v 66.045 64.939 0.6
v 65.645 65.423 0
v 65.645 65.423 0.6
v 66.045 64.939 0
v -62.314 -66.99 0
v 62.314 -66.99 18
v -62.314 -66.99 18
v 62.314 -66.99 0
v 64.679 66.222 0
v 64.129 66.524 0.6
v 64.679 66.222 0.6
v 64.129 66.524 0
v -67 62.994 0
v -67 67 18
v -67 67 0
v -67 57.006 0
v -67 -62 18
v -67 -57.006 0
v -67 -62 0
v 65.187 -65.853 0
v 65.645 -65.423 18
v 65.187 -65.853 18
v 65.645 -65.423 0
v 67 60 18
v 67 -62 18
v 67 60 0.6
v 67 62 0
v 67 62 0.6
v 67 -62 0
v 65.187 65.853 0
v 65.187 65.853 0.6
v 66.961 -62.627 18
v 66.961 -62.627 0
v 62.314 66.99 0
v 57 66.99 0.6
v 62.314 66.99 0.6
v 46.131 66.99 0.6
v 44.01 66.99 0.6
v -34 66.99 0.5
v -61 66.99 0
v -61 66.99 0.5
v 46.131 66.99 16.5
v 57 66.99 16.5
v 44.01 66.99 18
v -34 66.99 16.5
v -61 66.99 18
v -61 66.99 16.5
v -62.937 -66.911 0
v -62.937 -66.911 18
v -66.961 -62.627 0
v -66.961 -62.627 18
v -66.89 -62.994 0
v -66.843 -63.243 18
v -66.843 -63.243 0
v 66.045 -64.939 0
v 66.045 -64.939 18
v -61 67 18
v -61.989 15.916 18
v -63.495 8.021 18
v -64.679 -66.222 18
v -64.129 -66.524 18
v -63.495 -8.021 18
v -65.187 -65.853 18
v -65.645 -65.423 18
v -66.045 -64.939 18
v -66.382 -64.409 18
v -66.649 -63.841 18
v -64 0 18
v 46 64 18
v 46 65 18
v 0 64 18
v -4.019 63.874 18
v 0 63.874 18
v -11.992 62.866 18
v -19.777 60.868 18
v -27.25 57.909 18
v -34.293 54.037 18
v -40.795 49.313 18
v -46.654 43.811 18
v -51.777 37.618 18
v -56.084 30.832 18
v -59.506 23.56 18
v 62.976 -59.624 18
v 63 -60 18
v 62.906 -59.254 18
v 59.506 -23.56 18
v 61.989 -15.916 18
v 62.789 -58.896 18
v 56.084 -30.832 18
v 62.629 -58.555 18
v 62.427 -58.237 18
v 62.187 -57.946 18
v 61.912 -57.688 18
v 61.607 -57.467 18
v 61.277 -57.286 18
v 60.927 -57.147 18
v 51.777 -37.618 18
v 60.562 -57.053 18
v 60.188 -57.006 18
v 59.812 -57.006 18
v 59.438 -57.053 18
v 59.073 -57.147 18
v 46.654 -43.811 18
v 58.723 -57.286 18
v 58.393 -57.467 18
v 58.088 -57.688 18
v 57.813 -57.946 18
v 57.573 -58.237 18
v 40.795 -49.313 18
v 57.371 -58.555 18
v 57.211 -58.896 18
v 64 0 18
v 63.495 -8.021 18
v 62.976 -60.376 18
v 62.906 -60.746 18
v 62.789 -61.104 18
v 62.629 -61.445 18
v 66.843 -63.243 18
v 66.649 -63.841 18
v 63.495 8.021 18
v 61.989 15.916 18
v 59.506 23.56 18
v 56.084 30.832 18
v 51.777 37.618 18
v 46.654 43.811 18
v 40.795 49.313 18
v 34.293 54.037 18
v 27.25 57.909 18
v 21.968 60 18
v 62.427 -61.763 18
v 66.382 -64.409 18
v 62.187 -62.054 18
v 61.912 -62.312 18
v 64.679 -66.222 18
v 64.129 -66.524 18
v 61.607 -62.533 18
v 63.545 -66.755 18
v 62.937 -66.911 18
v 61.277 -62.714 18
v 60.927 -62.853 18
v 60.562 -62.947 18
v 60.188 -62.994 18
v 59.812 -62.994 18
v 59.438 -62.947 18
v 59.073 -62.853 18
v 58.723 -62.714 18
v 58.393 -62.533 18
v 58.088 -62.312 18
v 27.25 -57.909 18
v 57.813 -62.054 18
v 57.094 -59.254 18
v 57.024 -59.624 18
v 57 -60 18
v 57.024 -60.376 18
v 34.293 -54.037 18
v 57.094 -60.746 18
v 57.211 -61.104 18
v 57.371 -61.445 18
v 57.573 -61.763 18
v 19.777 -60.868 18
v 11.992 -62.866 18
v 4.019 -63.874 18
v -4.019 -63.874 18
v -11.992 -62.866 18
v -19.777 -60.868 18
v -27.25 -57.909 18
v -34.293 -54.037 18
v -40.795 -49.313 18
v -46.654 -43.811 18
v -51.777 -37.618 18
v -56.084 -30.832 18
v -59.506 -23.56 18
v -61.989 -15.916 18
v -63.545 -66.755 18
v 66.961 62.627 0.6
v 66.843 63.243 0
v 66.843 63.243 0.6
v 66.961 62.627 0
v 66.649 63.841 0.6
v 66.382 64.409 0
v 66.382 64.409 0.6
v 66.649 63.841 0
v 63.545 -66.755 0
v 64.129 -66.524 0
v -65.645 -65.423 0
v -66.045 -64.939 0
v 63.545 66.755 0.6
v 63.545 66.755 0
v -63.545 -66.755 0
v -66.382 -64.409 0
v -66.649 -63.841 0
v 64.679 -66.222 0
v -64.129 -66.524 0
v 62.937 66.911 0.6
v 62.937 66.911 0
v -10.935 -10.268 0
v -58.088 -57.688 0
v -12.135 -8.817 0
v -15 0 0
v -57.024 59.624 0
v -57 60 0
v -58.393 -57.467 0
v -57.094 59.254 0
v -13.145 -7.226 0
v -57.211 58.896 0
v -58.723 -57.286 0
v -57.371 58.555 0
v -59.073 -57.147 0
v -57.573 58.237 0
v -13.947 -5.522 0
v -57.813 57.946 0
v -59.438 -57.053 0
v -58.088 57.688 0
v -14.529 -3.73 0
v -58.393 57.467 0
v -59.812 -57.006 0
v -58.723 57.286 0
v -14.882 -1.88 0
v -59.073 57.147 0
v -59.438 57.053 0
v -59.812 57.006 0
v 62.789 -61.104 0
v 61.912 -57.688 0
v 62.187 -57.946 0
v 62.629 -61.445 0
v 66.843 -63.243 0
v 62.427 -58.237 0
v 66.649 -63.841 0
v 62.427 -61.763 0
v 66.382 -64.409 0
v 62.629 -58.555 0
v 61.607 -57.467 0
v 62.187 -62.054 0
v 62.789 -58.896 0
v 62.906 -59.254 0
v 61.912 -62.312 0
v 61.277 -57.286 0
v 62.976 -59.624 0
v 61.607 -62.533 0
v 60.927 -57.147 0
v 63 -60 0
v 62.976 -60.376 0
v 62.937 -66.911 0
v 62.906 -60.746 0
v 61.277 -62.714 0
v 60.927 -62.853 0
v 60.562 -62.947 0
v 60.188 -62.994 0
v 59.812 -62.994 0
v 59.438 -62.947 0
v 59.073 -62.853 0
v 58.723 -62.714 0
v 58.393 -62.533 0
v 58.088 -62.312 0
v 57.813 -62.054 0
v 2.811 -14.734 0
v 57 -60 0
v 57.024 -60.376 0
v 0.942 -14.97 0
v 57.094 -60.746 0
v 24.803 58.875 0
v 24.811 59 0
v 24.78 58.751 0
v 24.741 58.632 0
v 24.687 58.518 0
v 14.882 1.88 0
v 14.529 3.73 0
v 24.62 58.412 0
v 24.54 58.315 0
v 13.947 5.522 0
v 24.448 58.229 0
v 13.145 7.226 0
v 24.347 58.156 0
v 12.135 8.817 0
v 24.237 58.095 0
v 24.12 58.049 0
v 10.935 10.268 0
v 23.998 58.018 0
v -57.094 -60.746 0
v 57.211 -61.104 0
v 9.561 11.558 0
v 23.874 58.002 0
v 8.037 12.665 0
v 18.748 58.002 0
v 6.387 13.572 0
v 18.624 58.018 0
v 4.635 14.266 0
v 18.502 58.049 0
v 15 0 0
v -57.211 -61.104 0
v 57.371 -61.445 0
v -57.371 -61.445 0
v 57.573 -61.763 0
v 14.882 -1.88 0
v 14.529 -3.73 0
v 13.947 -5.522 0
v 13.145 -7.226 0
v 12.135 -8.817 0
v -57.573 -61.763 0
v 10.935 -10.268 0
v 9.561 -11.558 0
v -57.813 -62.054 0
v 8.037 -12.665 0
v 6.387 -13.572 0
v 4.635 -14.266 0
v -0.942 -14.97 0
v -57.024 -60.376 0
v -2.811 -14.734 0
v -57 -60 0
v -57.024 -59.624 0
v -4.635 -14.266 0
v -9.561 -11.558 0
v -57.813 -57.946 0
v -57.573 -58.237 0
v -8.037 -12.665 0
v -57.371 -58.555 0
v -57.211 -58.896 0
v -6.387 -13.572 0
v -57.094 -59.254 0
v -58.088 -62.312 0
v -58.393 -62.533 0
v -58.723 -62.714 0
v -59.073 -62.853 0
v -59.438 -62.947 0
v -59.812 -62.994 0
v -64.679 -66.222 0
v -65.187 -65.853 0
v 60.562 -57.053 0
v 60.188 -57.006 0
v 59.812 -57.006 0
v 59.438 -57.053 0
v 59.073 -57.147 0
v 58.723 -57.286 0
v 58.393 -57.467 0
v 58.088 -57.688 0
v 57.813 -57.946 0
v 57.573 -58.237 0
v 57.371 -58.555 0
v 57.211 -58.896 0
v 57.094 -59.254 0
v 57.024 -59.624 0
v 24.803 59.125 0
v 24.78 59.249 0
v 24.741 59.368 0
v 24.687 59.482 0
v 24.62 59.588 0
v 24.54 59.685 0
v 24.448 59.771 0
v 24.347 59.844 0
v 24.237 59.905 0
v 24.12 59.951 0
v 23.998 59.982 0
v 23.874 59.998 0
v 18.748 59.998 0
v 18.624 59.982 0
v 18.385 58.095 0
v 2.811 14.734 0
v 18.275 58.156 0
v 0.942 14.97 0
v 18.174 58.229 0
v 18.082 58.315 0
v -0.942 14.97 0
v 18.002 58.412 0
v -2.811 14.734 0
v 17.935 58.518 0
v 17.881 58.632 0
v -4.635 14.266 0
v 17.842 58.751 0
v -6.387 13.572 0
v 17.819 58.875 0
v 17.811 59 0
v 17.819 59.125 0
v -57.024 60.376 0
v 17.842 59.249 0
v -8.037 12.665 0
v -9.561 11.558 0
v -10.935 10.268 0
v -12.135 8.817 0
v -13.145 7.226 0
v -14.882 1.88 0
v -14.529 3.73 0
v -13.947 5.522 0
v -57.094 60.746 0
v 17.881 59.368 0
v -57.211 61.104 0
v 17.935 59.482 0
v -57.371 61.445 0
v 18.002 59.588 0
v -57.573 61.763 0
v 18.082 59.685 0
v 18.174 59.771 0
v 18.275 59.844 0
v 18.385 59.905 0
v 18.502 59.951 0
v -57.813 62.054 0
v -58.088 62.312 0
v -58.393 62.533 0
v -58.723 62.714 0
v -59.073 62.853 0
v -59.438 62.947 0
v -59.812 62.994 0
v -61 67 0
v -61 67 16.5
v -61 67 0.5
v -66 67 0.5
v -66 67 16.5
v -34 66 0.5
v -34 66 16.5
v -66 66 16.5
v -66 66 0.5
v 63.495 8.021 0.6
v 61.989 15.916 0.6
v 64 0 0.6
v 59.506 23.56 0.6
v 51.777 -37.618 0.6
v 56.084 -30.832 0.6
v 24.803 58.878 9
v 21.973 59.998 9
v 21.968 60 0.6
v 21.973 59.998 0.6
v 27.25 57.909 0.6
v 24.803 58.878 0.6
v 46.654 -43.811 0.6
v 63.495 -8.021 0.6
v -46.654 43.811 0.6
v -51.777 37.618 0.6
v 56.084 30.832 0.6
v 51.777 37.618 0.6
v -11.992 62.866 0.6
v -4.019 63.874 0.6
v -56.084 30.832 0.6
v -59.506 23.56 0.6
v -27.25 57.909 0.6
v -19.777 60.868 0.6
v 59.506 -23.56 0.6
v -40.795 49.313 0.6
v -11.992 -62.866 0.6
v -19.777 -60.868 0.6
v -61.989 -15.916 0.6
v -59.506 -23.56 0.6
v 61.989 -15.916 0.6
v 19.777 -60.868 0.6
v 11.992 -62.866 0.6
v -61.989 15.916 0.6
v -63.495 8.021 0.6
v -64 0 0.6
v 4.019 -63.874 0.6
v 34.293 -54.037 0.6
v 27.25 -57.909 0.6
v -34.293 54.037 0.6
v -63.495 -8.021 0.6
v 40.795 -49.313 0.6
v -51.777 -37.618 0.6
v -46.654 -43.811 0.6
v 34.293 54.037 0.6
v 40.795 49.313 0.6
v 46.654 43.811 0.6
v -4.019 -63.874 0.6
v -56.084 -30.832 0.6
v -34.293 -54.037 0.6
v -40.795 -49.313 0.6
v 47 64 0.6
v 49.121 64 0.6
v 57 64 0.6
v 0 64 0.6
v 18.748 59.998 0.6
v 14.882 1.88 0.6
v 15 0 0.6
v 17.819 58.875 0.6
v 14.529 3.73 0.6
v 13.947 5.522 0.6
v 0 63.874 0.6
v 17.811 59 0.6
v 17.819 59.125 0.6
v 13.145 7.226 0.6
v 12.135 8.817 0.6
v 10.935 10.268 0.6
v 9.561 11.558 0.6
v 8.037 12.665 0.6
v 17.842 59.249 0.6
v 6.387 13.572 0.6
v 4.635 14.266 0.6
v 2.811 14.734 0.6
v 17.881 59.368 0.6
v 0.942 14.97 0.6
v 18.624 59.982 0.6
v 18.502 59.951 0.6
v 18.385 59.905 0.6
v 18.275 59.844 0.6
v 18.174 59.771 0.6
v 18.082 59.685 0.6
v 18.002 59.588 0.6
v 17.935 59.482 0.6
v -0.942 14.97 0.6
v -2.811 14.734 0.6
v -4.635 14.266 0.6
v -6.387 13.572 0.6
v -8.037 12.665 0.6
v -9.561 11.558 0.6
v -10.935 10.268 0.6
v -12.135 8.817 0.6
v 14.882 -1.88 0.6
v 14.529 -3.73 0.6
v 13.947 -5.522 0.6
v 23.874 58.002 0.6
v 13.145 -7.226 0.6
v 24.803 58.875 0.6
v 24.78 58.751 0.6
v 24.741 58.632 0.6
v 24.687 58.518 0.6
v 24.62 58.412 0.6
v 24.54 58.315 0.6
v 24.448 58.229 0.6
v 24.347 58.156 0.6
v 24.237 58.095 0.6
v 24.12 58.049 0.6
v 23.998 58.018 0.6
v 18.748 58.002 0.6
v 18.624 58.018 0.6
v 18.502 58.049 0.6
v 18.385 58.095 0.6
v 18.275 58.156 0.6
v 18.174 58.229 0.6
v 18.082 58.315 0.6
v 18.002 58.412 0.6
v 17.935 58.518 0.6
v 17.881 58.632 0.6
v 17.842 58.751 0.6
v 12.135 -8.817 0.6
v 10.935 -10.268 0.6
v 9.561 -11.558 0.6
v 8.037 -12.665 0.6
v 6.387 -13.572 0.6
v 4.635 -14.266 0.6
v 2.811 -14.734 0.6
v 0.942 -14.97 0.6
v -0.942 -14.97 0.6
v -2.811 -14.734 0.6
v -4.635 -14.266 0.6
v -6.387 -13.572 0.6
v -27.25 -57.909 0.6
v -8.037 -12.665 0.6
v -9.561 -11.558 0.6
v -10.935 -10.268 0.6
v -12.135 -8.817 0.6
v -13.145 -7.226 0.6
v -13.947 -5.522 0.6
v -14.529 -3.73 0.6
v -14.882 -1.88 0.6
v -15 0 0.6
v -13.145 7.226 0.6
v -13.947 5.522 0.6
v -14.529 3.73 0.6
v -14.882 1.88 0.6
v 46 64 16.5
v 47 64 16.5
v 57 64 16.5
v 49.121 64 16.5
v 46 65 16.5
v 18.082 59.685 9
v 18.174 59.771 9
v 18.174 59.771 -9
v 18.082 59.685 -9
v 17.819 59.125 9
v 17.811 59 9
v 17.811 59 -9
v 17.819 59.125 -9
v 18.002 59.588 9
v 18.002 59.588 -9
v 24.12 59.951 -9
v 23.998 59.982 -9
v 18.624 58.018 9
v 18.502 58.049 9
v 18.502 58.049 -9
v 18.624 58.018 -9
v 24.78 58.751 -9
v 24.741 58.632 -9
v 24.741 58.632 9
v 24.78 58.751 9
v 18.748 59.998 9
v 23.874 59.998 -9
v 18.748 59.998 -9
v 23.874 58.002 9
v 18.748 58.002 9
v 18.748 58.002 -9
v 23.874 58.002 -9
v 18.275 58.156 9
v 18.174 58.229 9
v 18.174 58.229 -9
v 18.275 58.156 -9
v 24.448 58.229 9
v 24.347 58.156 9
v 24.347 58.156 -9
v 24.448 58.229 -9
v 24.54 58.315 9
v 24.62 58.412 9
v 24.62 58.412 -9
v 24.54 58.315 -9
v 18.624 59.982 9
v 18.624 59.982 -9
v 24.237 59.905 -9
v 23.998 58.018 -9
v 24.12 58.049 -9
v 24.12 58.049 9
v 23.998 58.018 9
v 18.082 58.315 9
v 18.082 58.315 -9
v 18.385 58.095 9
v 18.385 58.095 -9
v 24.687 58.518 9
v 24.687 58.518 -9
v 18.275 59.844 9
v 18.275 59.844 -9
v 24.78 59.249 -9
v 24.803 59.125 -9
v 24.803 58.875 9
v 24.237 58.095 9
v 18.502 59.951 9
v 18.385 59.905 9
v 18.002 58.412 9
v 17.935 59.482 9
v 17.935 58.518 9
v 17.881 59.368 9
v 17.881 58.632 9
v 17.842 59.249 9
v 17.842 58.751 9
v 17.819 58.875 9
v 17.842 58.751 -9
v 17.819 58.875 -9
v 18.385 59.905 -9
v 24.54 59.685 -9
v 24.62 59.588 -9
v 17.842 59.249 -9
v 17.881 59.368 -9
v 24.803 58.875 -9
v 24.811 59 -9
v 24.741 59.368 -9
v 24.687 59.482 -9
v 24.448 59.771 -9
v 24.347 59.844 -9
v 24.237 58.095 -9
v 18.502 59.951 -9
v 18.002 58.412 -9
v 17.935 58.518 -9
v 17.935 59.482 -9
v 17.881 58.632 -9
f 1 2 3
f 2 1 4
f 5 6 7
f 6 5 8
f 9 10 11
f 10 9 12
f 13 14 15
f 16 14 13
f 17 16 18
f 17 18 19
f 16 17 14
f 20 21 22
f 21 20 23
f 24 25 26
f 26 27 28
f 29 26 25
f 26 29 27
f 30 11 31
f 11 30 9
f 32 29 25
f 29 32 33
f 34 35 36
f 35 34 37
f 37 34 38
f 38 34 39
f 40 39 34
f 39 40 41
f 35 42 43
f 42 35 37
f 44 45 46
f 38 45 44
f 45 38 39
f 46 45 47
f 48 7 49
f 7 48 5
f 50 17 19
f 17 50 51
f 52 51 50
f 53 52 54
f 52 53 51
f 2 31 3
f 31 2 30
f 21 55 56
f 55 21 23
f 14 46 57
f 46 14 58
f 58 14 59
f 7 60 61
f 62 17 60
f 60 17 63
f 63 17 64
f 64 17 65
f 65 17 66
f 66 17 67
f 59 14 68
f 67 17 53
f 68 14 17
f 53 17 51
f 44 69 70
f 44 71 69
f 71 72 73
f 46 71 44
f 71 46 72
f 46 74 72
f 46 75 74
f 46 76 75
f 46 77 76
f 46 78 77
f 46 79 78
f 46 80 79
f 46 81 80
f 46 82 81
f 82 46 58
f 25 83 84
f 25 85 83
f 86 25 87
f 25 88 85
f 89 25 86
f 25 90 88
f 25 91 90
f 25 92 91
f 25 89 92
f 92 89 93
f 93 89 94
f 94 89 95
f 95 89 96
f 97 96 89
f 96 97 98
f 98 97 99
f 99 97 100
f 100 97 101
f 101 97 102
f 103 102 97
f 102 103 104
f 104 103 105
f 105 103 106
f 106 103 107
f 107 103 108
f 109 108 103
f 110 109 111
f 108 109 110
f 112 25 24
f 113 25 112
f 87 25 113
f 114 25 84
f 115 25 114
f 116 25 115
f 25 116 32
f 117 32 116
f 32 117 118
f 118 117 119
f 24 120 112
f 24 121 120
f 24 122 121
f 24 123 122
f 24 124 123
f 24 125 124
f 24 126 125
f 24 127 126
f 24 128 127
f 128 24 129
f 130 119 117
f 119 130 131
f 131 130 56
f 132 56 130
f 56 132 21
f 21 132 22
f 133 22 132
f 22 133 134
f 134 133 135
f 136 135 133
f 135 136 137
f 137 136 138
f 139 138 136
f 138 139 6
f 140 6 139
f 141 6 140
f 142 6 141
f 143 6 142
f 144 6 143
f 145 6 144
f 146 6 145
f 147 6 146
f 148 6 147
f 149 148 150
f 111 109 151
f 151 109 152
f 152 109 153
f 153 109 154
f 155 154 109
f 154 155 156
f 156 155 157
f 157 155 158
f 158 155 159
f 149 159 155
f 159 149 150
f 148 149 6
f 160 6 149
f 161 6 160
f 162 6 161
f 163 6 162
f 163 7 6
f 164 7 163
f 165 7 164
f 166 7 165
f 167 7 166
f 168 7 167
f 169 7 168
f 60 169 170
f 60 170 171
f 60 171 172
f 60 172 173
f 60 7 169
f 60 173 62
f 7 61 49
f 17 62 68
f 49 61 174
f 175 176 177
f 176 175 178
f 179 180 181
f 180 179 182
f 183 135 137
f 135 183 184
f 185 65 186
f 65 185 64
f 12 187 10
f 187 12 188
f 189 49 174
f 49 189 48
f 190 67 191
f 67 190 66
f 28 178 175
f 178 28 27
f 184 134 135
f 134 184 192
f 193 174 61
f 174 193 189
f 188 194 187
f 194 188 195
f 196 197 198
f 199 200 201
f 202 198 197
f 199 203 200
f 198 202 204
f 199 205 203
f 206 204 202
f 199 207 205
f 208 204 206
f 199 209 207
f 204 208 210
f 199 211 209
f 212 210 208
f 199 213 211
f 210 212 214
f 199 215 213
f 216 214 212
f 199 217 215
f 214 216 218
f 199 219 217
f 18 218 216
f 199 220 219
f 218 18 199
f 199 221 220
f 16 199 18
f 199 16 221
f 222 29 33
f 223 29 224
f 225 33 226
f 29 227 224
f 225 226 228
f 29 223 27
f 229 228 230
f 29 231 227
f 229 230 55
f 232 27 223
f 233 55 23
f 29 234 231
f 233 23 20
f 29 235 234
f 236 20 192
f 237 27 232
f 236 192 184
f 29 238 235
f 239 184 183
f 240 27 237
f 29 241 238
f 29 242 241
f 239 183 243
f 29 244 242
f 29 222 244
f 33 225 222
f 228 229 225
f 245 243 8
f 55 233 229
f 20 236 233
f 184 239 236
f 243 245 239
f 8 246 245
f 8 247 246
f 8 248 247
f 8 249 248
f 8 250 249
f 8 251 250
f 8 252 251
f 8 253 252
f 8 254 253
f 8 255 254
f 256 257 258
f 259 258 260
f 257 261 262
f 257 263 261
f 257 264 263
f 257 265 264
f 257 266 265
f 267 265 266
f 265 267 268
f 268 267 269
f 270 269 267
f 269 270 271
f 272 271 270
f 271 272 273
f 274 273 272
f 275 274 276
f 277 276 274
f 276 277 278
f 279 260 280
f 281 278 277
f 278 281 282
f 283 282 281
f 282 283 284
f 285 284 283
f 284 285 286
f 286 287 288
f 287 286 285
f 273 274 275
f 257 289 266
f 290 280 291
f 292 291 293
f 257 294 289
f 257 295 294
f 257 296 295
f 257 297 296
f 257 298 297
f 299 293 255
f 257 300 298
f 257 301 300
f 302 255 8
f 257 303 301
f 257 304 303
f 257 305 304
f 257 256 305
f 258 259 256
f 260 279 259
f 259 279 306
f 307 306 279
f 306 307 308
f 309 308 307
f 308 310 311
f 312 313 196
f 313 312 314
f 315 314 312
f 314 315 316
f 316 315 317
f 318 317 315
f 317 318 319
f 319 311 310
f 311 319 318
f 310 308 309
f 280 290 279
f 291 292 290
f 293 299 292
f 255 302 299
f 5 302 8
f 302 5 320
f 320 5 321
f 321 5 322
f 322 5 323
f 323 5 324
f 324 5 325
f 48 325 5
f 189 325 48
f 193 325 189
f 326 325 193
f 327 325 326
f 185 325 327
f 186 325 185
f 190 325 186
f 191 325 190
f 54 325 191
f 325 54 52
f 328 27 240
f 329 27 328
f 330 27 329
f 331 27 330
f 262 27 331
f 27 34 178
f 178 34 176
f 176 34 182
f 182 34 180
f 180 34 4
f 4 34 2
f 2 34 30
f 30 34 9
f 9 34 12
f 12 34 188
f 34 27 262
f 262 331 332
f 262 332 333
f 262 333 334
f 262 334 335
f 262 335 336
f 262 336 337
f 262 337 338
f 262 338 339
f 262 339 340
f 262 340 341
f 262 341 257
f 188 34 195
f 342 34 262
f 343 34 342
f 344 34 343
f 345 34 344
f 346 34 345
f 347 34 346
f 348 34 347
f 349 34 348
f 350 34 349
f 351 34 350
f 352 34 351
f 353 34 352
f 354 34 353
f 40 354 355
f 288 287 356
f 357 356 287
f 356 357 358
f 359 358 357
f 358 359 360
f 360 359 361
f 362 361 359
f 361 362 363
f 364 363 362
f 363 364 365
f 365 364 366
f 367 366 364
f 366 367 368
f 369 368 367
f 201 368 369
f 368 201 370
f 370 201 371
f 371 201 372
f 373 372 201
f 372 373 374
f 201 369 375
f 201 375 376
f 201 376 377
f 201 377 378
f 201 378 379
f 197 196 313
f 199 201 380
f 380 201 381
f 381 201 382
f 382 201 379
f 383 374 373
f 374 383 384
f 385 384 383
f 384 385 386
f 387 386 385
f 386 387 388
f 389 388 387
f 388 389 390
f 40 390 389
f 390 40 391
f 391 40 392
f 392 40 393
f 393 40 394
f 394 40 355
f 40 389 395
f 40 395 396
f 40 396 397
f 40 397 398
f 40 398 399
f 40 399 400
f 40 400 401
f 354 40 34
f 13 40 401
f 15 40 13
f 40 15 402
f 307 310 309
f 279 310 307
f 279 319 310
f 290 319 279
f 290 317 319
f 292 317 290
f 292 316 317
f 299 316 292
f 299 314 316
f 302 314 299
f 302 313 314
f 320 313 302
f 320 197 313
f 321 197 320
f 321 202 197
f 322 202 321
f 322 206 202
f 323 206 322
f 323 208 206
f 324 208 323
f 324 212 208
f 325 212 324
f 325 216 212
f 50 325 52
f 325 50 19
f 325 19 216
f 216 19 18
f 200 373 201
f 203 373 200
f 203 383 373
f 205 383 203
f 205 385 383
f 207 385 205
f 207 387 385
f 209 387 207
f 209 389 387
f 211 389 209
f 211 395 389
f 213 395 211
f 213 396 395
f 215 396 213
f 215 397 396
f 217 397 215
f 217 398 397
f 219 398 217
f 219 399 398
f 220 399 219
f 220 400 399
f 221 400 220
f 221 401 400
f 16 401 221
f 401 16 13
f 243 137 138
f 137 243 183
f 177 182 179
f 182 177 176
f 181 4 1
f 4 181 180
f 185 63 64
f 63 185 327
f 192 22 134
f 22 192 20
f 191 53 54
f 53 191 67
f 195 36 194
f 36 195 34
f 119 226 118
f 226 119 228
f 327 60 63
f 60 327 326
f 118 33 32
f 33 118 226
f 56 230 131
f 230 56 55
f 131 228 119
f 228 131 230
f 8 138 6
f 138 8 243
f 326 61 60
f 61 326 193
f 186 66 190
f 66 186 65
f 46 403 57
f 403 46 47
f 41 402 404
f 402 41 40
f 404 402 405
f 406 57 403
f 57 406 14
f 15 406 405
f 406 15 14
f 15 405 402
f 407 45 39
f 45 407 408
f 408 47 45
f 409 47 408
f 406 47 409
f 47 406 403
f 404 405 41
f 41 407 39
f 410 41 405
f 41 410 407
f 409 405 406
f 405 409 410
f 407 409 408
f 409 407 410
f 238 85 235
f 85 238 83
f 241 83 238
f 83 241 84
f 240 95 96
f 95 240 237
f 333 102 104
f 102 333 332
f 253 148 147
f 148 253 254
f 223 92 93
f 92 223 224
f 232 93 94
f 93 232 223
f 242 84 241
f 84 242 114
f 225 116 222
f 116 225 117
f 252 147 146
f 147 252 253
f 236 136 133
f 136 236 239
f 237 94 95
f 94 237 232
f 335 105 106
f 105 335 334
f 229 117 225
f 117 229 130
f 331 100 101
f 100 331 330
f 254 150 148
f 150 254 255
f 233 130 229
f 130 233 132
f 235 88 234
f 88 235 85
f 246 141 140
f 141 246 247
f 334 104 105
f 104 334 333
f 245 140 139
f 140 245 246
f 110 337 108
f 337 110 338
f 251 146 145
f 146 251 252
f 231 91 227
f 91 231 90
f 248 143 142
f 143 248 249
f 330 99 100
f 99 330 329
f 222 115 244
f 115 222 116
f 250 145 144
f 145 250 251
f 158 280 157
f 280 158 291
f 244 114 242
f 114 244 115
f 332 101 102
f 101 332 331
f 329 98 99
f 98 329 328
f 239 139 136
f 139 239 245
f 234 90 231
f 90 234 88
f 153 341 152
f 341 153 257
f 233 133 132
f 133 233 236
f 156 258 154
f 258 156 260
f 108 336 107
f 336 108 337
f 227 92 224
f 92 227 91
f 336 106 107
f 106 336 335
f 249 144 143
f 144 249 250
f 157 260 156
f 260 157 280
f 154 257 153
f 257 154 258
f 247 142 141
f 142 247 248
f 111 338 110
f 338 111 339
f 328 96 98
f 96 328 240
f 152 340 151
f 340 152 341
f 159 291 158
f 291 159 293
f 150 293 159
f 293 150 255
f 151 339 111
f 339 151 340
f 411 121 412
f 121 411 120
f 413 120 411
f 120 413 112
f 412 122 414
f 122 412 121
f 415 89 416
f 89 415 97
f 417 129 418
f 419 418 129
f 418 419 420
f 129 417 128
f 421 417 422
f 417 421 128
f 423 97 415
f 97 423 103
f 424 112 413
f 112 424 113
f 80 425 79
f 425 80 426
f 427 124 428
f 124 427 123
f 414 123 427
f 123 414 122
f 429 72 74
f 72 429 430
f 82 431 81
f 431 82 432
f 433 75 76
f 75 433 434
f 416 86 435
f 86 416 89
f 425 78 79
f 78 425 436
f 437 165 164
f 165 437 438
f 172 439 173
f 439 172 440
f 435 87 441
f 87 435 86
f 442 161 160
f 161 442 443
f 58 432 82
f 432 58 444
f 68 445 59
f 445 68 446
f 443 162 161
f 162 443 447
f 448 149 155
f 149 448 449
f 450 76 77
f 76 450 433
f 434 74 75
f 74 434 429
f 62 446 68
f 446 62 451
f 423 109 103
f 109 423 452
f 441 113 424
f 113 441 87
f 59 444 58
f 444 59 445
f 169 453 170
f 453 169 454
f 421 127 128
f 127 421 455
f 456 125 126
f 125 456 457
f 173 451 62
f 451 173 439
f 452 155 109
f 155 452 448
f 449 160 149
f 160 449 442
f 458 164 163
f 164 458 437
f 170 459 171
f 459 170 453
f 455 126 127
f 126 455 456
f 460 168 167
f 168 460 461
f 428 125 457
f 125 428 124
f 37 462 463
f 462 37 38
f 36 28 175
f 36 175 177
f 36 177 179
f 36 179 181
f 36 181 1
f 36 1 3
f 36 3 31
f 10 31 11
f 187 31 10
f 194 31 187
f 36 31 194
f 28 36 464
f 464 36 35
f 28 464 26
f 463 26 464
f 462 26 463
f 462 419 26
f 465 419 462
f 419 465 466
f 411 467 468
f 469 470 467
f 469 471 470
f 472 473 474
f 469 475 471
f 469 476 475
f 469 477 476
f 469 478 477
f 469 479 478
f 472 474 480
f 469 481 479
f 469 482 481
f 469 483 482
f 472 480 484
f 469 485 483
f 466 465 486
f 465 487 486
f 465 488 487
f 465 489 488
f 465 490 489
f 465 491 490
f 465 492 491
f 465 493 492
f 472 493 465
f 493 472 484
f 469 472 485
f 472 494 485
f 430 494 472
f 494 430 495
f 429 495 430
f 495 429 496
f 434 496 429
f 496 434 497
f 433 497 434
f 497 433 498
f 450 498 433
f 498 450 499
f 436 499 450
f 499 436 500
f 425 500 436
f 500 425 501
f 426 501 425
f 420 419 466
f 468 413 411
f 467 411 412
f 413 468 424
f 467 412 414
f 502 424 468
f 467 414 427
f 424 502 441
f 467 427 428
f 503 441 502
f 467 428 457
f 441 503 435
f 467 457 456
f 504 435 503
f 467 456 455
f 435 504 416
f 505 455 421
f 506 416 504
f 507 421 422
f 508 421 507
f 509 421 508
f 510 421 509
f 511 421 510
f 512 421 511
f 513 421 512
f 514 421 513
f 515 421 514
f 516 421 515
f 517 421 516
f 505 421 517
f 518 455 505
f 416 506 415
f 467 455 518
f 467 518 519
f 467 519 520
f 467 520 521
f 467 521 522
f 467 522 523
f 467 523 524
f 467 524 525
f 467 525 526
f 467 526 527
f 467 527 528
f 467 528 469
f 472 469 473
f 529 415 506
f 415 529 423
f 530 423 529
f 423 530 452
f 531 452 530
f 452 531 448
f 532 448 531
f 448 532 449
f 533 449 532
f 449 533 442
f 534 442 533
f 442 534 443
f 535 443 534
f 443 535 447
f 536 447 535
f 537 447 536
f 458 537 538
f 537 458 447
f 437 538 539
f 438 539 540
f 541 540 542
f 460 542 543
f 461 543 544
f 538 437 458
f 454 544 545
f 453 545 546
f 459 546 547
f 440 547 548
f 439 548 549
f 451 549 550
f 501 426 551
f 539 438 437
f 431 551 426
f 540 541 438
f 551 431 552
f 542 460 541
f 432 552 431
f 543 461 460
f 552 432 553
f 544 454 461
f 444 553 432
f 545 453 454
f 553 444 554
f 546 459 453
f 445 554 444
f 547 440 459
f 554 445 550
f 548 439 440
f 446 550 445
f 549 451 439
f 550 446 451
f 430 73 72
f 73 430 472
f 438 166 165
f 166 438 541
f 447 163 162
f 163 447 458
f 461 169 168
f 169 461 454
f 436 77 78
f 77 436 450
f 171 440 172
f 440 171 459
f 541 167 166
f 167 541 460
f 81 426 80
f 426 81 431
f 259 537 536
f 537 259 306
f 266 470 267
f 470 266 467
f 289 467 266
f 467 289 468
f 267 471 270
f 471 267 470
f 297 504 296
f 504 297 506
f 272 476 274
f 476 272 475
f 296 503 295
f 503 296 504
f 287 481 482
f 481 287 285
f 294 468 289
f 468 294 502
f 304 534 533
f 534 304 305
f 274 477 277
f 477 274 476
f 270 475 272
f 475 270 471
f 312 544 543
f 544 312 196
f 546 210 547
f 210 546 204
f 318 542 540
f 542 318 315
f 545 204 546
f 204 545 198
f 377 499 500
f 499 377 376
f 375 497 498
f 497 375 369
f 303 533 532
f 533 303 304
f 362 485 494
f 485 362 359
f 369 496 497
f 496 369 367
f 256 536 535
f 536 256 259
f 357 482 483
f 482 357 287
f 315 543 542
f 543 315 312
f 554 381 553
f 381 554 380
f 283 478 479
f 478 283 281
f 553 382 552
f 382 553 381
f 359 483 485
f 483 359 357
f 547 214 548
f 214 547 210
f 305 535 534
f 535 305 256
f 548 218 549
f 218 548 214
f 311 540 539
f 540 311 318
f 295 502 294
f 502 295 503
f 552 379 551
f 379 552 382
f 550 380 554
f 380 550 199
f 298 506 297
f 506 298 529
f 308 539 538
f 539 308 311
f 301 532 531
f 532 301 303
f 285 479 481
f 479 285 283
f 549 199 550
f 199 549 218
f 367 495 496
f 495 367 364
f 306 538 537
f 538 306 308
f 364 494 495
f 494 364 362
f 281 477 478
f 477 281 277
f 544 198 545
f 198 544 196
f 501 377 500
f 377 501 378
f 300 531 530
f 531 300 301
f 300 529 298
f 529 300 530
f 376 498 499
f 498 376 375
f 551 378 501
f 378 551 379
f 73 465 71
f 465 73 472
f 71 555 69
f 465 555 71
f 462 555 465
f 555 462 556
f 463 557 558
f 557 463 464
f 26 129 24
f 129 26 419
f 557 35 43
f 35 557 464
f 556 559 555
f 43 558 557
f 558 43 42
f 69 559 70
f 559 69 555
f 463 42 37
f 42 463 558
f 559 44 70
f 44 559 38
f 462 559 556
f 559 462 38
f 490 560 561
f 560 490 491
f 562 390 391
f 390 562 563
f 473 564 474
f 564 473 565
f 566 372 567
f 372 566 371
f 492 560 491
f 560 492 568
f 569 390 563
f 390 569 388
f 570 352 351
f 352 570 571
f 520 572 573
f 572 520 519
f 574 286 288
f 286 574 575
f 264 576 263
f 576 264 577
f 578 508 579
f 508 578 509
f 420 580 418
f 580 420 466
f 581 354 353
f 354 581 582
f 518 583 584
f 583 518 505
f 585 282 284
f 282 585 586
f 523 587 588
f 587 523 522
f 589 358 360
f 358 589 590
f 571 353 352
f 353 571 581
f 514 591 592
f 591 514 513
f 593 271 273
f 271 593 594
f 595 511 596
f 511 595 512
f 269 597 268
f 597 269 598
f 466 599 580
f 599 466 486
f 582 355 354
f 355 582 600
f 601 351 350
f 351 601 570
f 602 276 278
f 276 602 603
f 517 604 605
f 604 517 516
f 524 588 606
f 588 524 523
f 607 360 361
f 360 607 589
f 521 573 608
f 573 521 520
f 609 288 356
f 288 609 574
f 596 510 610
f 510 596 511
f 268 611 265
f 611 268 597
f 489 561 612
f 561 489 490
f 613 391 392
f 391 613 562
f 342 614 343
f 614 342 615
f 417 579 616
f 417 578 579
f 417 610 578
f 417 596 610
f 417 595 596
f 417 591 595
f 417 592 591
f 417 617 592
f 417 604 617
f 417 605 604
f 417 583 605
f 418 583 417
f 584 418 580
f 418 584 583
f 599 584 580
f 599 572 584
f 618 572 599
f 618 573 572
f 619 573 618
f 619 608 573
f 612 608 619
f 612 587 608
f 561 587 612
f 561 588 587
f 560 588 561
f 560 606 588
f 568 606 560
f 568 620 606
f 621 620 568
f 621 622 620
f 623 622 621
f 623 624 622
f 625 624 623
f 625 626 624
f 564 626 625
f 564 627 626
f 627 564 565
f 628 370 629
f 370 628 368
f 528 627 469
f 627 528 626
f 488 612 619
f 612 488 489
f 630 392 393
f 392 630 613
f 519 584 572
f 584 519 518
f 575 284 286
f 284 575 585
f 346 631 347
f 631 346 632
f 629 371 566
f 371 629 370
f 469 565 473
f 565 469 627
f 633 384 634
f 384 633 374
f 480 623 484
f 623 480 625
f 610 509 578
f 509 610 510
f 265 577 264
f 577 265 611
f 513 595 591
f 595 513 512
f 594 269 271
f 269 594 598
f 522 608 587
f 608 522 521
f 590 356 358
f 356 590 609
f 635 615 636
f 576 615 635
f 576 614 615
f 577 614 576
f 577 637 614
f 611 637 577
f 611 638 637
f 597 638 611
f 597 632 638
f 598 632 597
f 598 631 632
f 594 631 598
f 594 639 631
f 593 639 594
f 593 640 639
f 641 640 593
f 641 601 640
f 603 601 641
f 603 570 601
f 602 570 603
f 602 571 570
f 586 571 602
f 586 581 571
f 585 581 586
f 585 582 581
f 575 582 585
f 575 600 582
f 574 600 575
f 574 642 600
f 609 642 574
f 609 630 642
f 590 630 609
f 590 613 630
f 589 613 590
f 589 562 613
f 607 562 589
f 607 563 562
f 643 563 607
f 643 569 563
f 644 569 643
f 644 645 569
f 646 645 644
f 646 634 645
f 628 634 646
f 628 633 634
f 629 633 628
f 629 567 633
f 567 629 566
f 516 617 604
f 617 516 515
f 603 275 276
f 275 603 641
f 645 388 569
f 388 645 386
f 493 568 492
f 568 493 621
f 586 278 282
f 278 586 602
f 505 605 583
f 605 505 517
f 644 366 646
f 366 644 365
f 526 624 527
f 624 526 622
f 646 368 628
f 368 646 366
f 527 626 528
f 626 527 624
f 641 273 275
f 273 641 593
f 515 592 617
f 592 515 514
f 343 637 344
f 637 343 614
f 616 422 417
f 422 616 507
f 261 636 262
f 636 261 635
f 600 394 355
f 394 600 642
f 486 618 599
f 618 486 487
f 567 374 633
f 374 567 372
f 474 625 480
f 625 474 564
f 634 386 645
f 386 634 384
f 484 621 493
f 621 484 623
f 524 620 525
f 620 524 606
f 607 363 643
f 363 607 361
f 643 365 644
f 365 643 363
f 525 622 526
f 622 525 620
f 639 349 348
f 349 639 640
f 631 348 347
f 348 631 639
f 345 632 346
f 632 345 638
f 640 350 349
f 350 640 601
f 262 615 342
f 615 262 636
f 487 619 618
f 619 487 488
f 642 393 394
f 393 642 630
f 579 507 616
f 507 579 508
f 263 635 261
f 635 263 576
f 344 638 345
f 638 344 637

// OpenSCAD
$fn = 50;


union() {
	difference() {
		union() {
			hull() {
				translate(v = [-62.0000000000, 62.0000000000, 0]) {
					cylinder(h = 18, r = 5);
				}
				translate(v = [62.0000000000, 62.0000000000, 0]) {
					cylinder(h = 18, r = 5);
				}
				translate(v = [-62.0000000000, -62.0000000000, 0]) {
					cylinder(h = 18, r = 5);
				}
				translate(v = [62.0000000000, -62.0000000000, 0]) {
					cylinder(h = 18, r = 5);
				}
			}
			translate(v = [-67.0000000000, 61.0000000000, 0]) {
				cube(size = [6, 6, 18]);
			}
		}
		union() {
			translate(v = [-67.5000000000, -60.0000000000, -250.0000000000]) {
				rotate(a = [0, 0, 0]) {
					difference() {
						union() {
							hull() {
								translate(v = [7.5000000000, 0, 0]) {
									cylinder(h = 250, r = 3.0000000000, r1 = 3.0000000000, r2 = 3.0000000000);
								}
								translate(v = [-7.5000000000, 0, 0]) {
									cylinder(h = 250, r = 3.0000000000, r1 = 3.0000000000, r2 = 3.0000000000);
								}
							}
						}
						union();
					}
				}
			}
			translate(v = [-67.5000000000, 60.0000000000, -250.0000000000]) {
				rotate(a = [0, 0, 0]) {
					difference() {
						union() {
							hull() {
								translate(v = [7.5000000000, 0, 0]) {
									cylinder(h = 250, r = 3.0000000000, r1 = 3.0000000000, r2 = 3.0000000000);
								}
								translate(v = [-7.5000000000, 0, 0]) {
									cylinder(h = 250, r = 3.0000000000, r1 = 3.0000000000, r2 = 3.0000000000);
								}
							}
						}
						union();
					}
				}
			}
			translate(v = [-66.0000000000, 66.0000000000, 0.5000000000]) {
				cube(size = [32, 1, 16]);
			}
			translate(v = [60.0000000000, -60.0000000000, 0]) {
				cylinder(h = 100, r = 3.0000000000);
			}
			translate(v = [0, 0, 0.6000000000]) {
				cylinder(h = 20.4000000000, r = 64.0000000000);
			}
			translate(v = [0, 0, -9.0000000000]) {
				cylinder(h = 18, r = 15.0000000000);
			}
			translate(v = [0.0000000000, 60.0000000000, 0.6000000000]) {
				cube(size = [67.0000000000, 4, 20.4000000000]);
			}
			translate(v = [57.0000000000, 60.0000000000, 0.6000000000]) {
				cube(size = [10, 7, 20.4000000000]);
			}
			translate(v = [46.0000000000, 60.0000000000, 16.5000000000]) {
				cube(size = [21, 7, 1.5000000000]);
			}
			translate(v = [43.2500000000, 67.7500000000, 0.6000000000]) {
				rotate(a = [0, 0, -45]) {
					cube(size = [7.5000000000, 1.5000000000, 20.4000000000]);
				}
			}
			translate(v = [12.0610000000, 58.0000000000, 0.6000000000]) {
				cube(size = [7.5000000000, 2, 17.4000000000]);
			}
		}
	}
	union() {
		translate(v = [21.3110000000, 59.0000000000, -9.0000000000]) {
			rotate(a = [0, 0, 0]) {
				difference() {
					union() {
						#hull() {
							#translate(v = [2.5000000000, 0, 0]) {
								cylinder(h = 18, r = 1.0000000000, r1 = 1.0000000000, r2 = 1.0000000000);
							}
							#translate(v = [-2.5000000000, 0, 0]) {
								cylinder(h = 18, r = 1.0000000000, r1 = 1.0000000000, r2 = 1.0000000000);
							}
						}
					}
					union();
				}
			}
		}
	}
}
